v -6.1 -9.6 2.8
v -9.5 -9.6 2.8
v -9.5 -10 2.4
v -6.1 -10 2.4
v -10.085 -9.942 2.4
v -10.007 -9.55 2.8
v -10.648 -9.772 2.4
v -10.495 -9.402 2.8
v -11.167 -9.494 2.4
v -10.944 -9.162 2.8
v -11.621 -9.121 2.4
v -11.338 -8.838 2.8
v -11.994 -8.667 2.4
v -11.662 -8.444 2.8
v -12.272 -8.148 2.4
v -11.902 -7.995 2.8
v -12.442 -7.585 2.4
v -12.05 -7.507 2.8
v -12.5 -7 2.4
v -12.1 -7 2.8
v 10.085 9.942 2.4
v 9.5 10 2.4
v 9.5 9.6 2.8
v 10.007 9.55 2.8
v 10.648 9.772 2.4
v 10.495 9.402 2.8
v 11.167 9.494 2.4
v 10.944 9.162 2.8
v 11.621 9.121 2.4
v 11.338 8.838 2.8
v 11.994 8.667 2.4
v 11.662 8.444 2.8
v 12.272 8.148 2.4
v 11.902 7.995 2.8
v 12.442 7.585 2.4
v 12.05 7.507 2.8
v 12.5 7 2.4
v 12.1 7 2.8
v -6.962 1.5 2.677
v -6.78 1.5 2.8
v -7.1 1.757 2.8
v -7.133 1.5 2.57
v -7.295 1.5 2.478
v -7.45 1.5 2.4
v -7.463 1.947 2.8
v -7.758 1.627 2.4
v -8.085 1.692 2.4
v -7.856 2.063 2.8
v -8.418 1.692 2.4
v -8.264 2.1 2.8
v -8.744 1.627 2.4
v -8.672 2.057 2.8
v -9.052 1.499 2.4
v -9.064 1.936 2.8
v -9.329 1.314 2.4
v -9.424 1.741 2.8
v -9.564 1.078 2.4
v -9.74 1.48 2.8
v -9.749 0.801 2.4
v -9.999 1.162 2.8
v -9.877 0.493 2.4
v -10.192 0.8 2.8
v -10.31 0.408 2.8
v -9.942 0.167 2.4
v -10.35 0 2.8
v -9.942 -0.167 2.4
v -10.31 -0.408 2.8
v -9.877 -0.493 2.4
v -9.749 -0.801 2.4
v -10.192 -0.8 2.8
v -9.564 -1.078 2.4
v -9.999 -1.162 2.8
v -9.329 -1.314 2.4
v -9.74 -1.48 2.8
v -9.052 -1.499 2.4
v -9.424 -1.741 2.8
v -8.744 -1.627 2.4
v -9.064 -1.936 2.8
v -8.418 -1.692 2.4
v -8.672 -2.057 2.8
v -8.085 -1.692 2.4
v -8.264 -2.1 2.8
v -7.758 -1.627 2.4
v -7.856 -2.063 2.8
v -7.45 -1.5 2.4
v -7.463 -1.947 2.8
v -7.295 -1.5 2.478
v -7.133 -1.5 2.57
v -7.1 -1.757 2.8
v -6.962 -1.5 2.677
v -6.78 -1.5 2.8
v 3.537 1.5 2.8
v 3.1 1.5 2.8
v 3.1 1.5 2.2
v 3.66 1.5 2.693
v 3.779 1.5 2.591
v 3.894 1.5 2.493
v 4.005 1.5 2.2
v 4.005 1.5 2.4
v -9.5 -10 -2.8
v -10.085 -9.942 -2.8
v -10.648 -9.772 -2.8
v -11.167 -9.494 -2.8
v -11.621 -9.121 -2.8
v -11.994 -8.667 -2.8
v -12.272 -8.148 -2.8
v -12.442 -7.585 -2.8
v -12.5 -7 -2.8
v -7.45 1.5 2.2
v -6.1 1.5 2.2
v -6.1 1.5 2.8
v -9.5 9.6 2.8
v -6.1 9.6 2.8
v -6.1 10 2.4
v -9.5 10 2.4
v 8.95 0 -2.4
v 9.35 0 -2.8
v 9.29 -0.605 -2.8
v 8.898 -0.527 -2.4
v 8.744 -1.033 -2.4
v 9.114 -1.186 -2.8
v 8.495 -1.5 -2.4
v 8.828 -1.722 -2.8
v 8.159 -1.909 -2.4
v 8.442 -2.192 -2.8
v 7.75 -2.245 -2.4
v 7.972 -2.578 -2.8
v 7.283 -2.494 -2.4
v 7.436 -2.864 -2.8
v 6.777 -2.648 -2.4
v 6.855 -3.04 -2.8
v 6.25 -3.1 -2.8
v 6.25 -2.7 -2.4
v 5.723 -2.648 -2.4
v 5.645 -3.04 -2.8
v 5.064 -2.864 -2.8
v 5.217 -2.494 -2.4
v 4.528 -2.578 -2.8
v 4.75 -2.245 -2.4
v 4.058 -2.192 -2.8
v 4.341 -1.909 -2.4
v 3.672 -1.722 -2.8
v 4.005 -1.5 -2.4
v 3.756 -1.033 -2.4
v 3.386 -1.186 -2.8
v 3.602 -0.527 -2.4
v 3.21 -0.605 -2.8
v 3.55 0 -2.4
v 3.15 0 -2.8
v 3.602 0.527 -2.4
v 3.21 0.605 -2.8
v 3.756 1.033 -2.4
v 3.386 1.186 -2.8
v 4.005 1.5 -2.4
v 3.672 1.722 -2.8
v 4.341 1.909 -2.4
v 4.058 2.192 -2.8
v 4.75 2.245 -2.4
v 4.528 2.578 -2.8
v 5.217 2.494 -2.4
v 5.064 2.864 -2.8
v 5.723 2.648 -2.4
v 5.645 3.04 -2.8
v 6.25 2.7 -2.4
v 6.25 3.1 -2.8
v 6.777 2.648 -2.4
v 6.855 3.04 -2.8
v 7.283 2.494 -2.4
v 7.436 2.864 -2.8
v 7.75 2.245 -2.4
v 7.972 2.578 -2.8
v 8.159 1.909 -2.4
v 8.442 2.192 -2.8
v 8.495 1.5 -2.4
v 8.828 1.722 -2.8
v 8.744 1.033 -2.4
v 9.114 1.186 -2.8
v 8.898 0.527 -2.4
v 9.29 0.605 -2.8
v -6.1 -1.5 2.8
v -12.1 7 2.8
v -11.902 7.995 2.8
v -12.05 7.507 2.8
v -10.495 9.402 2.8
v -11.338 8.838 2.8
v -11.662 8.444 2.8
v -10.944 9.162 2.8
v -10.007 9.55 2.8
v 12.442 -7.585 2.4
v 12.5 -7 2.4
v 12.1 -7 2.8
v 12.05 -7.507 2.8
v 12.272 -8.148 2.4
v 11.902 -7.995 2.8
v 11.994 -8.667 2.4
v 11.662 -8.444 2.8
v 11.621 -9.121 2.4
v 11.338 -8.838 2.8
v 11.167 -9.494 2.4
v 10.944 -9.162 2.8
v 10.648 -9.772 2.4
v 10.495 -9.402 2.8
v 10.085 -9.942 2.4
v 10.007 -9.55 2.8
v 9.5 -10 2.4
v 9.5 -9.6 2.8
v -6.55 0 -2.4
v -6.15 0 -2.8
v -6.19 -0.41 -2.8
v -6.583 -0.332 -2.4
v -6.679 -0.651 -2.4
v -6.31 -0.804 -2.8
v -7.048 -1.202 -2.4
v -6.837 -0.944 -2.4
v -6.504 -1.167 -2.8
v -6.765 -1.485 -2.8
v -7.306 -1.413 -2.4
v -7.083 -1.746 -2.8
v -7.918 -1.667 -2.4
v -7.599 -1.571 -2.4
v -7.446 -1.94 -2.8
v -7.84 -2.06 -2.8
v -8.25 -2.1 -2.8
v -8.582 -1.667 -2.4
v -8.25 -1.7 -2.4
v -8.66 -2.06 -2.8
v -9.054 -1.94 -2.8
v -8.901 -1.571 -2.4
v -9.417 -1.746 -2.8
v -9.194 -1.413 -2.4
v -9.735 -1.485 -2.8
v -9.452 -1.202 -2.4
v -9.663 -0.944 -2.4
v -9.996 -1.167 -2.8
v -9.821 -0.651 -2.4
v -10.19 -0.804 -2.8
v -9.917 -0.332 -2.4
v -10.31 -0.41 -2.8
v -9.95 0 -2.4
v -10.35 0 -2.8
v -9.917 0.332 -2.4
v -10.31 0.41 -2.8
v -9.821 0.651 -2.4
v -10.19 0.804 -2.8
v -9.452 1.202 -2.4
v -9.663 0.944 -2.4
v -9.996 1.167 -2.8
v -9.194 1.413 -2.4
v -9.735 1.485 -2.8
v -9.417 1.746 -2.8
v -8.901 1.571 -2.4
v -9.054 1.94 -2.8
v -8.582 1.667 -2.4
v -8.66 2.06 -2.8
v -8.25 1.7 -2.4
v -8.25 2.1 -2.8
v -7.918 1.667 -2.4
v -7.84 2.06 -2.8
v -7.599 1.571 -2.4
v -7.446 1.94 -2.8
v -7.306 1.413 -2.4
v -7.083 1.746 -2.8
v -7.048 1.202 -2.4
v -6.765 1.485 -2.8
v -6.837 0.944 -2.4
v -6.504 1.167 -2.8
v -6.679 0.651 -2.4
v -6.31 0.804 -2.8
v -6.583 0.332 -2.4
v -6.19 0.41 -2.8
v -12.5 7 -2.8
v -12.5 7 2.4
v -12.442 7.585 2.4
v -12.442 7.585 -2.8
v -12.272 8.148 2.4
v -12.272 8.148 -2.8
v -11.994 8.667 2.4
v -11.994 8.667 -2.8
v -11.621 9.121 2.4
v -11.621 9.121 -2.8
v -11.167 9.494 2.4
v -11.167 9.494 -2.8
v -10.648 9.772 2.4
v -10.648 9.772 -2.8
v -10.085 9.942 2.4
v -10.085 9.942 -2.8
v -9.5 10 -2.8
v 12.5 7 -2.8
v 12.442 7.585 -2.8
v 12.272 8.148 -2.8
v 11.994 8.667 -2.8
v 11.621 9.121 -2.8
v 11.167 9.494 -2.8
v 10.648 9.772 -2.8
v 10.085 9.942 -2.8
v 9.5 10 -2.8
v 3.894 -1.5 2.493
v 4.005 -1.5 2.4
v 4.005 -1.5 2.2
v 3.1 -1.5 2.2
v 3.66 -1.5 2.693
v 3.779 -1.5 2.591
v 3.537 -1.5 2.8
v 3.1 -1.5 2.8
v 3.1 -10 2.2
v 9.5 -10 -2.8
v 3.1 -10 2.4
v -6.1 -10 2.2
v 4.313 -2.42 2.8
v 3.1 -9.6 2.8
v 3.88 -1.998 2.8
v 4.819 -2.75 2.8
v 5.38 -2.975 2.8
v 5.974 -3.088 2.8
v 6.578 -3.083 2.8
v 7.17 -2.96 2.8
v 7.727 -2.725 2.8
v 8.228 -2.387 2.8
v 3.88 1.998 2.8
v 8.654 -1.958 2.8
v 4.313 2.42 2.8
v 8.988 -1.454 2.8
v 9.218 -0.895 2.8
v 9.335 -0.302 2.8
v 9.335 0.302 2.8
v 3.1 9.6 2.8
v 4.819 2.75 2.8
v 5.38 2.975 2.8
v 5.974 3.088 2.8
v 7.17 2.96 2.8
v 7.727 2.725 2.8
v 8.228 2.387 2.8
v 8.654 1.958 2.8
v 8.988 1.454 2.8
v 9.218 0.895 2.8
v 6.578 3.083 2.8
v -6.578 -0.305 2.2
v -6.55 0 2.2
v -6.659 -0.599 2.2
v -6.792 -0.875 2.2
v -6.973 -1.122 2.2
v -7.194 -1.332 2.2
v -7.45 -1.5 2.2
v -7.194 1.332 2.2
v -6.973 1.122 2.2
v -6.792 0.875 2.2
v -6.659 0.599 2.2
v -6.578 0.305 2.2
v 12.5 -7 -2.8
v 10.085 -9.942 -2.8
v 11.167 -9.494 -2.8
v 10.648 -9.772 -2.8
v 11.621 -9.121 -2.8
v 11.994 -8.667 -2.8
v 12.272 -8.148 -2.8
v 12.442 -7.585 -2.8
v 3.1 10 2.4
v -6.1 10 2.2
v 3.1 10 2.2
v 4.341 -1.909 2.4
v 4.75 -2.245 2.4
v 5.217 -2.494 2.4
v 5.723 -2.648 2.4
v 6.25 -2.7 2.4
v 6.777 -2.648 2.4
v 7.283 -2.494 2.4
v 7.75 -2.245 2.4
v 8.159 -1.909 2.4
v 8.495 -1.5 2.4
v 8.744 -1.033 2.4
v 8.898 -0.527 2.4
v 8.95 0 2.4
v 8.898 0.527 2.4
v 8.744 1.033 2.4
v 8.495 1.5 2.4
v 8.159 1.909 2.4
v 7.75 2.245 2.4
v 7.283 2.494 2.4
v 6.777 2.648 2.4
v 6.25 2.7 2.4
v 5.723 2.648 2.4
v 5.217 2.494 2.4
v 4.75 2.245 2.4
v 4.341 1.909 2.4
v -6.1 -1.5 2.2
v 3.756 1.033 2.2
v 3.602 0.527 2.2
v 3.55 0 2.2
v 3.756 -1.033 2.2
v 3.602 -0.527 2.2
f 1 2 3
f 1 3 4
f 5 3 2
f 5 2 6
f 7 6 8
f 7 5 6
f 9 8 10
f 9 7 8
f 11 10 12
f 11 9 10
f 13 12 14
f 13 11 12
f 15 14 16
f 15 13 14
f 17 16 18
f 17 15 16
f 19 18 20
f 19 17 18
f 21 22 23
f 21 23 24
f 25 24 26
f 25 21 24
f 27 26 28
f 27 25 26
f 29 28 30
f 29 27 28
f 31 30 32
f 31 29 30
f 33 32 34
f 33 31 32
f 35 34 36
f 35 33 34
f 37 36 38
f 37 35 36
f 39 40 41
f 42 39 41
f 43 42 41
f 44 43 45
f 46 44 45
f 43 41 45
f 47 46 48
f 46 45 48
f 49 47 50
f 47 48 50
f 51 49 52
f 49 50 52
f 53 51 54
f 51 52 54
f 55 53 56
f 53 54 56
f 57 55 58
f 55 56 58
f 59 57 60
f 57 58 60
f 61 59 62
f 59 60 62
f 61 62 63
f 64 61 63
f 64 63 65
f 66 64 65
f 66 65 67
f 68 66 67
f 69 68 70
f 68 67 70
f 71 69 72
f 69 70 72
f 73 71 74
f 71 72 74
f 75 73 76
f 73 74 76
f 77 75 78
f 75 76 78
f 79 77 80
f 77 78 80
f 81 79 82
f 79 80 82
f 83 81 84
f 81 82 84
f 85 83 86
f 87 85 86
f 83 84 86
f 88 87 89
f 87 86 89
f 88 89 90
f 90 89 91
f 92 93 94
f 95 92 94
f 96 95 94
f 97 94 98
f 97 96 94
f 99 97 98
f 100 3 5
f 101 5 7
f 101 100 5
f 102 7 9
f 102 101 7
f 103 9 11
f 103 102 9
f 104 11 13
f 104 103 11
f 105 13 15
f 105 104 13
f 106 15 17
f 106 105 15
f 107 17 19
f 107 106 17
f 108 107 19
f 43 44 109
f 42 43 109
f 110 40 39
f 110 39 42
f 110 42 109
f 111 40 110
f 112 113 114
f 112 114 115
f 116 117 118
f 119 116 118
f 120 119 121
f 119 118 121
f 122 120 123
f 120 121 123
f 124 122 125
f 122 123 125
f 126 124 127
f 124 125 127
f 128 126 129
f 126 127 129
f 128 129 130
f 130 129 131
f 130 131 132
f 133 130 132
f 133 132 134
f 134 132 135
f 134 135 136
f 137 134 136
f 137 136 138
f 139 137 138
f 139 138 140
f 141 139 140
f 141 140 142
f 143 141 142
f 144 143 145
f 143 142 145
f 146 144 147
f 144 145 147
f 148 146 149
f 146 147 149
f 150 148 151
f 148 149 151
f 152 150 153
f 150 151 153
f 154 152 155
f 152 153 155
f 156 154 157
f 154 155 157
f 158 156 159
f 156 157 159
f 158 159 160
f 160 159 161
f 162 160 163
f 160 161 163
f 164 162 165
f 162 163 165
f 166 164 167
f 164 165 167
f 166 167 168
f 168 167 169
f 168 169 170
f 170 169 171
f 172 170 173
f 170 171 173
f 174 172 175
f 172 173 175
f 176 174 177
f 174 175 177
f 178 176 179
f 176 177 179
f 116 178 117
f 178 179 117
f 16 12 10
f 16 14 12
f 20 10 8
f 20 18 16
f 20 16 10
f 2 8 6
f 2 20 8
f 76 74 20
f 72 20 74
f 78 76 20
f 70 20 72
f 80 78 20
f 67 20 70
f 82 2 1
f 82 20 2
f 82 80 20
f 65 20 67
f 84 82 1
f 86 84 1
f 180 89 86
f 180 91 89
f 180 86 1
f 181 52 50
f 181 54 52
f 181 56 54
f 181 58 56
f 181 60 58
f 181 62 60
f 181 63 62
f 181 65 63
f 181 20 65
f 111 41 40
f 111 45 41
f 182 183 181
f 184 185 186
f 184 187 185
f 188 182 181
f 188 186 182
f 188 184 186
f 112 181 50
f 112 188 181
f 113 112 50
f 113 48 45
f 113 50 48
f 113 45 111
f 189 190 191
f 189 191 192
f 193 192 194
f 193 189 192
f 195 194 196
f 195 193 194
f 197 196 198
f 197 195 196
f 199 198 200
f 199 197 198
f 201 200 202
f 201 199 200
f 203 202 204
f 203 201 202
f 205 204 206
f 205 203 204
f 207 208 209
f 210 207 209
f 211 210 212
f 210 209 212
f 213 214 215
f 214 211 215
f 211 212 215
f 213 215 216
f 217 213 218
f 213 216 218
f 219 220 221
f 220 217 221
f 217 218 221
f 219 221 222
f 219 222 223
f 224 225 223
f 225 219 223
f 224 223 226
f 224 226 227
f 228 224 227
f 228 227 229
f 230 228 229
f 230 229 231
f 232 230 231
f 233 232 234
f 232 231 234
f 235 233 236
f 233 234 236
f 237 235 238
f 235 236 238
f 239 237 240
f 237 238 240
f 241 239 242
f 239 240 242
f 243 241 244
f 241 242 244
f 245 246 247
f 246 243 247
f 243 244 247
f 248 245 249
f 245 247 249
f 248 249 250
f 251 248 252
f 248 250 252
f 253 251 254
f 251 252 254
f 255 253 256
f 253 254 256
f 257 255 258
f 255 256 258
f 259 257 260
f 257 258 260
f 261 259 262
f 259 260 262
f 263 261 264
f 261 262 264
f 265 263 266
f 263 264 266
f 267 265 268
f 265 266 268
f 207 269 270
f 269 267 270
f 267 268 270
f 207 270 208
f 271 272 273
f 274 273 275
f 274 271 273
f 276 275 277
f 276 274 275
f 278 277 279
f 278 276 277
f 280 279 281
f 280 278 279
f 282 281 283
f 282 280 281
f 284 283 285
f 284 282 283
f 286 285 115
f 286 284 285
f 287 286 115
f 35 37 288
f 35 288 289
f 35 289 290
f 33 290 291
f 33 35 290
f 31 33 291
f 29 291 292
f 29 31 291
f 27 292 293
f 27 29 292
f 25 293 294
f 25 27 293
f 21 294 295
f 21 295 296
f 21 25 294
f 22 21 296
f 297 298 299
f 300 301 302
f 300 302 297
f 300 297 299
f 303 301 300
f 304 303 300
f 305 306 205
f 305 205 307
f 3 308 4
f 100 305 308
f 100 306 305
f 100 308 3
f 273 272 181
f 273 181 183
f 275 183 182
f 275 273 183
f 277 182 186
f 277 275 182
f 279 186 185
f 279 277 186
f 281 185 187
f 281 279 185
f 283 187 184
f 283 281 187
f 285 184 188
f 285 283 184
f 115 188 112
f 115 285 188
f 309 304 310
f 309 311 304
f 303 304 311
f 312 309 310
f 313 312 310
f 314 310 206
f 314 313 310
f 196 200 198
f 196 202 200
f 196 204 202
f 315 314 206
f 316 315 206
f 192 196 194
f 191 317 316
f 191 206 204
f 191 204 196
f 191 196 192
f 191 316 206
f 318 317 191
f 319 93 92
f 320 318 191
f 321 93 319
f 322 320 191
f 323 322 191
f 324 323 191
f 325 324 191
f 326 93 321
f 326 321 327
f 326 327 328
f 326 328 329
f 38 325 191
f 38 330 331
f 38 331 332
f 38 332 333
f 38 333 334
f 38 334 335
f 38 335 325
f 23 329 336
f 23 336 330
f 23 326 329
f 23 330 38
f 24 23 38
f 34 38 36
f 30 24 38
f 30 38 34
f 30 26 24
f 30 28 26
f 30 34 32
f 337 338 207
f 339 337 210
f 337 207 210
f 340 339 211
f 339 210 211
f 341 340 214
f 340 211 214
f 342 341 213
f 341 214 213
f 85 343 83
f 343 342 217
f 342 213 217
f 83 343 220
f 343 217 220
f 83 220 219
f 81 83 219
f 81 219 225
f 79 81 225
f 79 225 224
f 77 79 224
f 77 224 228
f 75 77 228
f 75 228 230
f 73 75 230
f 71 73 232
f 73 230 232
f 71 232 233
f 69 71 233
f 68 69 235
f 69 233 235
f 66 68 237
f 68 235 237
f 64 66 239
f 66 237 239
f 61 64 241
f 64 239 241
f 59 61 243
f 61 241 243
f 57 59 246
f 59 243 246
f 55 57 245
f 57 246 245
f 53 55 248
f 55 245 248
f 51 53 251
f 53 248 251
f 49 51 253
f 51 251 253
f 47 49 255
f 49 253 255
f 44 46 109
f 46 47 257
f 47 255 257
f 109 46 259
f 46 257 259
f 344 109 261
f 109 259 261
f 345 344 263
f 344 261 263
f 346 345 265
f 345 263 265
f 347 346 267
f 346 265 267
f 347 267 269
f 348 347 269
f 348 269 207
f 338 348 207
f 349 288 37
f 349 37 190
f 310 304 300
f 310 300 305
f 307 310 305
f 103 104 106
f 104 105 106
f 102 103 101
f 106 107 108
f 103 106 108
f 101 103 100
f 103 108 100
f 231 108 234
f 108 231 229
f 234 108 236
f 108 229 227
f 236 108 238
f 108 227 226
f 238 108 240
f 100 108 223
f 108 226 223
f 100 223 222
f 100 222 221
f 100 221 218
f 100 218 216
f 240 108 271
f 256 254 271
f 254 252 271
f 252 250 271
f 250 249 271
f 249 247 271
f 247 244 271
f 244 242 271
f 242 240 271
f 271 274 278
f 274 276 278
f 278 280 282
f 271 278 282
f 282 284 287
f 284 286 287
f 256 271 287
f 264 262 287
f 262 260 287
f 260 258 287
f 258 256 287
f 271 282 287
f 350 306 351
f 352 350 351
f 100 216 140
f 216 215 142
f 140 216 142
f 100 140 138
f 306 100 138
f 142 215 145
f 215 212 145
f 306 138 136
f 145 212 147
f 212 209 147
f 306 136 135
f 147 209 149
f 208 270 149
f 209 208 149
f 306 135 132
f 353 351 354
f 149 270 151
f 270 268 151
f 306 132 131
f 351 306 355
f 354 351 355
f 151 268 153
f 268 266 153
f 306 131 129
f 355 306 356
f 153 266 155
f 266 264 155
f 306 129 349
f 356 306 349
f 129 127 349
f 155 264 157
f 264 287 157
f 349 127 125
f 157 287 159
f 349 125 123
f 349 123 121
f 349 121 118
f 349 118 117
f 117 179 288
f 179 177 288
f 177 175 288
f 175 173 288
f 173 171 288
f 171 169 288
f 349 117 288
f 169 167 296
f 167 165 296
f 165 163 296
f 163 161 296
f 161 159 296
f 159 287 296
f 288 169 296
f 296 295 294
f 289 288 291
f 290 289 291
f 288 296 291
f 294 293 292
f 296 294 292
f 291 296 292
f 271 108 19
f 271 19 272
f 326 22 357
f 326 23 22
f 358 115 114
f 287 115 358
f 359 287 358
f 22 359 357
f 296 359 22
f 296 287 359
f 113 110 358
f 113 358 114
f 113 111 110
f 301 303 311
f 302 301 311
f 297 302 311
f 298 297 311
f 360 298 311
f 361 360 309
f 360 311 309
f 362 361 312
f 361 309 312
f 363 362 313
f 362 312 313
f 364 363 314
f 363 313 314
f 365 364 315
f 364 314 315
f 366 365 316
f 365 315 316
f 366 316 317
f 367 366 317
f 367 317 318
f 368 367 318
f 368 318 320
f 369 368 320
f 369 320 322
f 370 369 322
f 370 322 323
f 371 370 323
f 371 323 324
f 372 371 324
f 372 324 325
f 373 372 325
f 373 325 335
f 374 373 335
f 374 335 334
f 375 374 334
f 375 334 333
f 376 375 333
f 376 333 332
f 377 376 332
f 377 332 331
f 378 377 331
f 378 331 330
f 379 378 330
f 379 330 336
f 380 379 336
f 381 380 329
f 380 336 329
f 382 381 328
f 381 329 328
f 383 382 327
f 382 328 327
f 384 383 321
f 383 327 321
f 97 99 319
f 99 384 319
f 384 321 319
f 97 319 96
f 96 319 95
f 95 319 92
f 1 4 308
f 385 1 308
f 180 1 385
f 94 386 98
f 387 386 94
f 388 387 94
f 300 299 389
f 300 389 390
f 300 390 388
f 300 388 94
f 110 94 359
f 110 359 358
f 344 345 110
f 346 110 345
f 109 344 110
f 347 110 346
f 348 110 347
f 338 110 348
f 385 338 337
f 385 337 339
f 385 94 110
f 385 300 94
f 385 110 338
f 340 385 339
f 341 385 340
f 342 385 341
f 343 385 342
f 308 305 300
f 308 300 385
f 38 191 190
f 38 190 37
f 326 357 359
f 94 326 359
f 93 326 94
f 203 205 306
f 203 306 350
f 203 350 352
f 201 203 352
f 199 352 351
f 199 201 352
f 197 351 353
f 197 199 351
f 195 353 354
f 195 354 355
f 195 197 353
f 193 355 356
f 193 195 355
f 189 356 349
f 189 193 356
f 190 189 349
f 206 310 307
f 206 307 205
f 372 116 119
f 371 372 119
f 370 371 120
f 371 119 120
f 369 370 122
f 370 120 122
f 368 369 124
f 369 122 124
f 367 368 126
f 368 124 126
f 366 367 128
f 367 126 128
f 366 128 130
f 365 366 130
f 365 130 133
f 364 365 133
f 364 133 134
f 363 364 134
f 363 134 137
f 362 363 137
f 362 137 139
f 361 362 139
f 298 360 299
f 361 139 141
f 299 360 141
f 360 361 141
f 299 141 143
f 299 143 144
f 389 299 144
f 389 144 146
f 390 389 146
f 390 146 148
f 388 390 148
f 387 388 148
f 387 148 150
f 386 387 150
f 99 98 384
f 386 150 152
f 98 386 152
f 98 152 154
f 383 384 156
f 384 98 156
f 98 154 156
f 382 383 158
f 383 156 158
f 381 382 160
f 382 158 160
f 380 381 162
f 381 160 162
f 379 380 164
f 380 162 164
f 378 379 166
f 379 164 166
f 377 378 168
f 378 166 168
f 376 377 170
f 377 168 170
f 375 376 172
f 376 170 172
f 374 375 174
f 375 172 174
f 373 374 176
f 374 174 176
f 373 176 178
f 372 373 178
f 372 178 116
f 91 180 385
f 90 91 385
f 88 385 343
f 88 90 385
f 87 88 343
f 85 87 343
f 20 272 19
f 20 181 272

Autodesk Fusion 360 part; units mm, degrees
sketch "Sketch1" plane through (0, 0, 0) normal (0, 0, 1) x (1, 0, 0) in component "Component"
  line L0 (12.5, -10) -> (-12.5, -10)
  line L1 (-12.5, -10) -> (-12.5, 10)
  line L2 (-12.5, 10) -> (12.5, 10)
  line L3 (12.5, 10) -> (12.5, -10)
  line L4 (12.5, -10) -> (-12.5, 10) construction
  line L5 (-12.5, -10) -> (12.5, 10) construction
  line L6 (-12.5, 0) -> (12.5, 0) construction
  line L7 (0, 10) -> (0, -10) construction
  circle A0 centre (-8.25, 0) radius 1.7
  circle A1 centre (6.25, 0) radius 2.7
  dimension "d7" = 25
  dimension "d8" = 20
  dimension "d9" = 3.4
  dimension "d10" = 5.4
  dimension "d11" = 4.25
  dimension "d12" = 6.25
extrude "Extrude1" add sketch "Sketch1" along normal mid plane 5.6 in component "Component"
fillet "Fillet1" radius 3 4 edges at (-12.5, -10, 0) (12.5, -10, 0) (12.5, 10, 0) (-12.5, 10, 0) in component "Component"
chamfer "Chamfer1" distance 0.4 angle 45 12 edges at (0, -10, 2.8) (11.6213, -9.1213, 2.8) (12.5, 0, 2.8) (11.6213, 9.1213, 2.8) (0, 10, 2.8) (-11.6213, 9.1213, 2.8) (-12.5, 0, 2.8) (-11.6213, -9.1213, 2.8) (3.7327, 0.9764, 2.8) (-9.835, 0.6147, 2.8) (3.7327, -0.9764, -2.8) (-9.835, -0.6147, -2.8) in component "Component"
sketch "Sketch2" plane through (0, 0, 2.8) normal (0, 0, 1) x (-1, 0, 0) in component "Component"
  circle A0 centre (-6.25, 0) radius 3.1
  line L0 (9.5, 9.6) -> (-9.5, 9.6)
  arc A1 (-9.5, 9.6) -> (-12.1, 7) centre (-9.5, 7) ccw
  line L1 (-12.1, 7) -> (-12.1, -7)
  arc A2 (-12.1, -7) -> (-9.5, -9.6) centre (-9.5, -7) ccw
  line L2 (-9.5, -9.6) -> (9.5, -9.6)
  arc A3 (9.5, -9.6) -> (12.1, -7) centre (9.5, -7) ccw
  line L3 (12.1, -7) -> (12.1, 7)
  arc A4 (12.1, 7) -> (9.5, 9.6) centre (9.5, 7) ccw
  circle A5 centre (8.25, 0) radius 2.1
  line L4 (12.5, -10) -> (-12.5, -10)
  line L5 (12.5, 10) -> (12.5, -10)
  line L6 (-12.5, 10) -> (12.5, 10)
  line L7 (-12.5, -10) -> (-12.5, 10)
  line L8 (6.1, -10) -> (-3.1, -10)
  line L9 (-3.1, -10) -> (-3.1, 10)
  line L10 (-3.1, 10) -> (6.1, 10)
  line L11 (6.1, 10) -> (6.1, -10)
  dimension "d19" = 9.4
  dimension "d28" = 9.2
extrude "Extrude2" cut sketch "Sketch2" against normal blind 0.6 contours L0 L2 L9 L11 | L0 L6 L9 L10 L11 | L2 L4 L8 L9 L11 in component "Component"
sketch "Sketch3" plane through (0, 0, 2.8) normal (0, 0, 1) x (-1, 0, 0) in component "Component"
  line L0 (-3.1, -9.6) -> (-3.1, 9.6)
  line L1 (-3.1, 9.6) -> (-9.5, 9.6)
  arc A0 (-9.5, 9.6) -> (-12.1, 7) centre (-9.5, 7) ccw
  line L2 (-12.1, 7) -> (-12.1, -7)
  arc A1 (-12.1, -7) -> (-9.5, -9.6) centre (-9.5, -7) ccw
  line L3 (-9.5, -9.6) -> (-3.1, -9.6)
  circle A2 centre (-6.25, 0) radius 3.1
  line L4 (12.5, -10) -> (-12.5, -10)
  line L5 (12.5, 10) -> (12.5, -10)
  line L6 (-12.5, 10) -> (12.5, 10)
  line L7 (-12.5, -10) -> (-12.5, 10)
  line L8 (-8, 1.5) -> (8, 1.5)
  line L9 (8, 1.5) -> (8, -1.5)
  line L10 (8, -1.5) -> (-8, -1.5)
  line L11 (-8, -1.5) -> (-8, 1.5)
  line L12 (-8, 1.5) -> (8, -1.5) construction
  line L13 (8, 1.5) -> (-8, -1.5) construction
  dimension "d22" = 3
  dimension "d23" = 16
extrude "Extrude3" cut sketch "Sketch3" against normal blind 0.6 contours L0 A2 L8 L10 | L0 L8 L9 L10 | A2 L8 L10 L11 picked at (-6.3833, 0) in component "Component"
component "Component" placed x (1, 0, 0) y (0, 1, 0) z (0, 0, 1) at (0, 0, 0)
equation "d7 = z_belt_width + 16 mm"
equation "d13 = ( 5.6 / 2 ) * 1 mm"
equation "d17 = chamfer"
equation "z_belt_width = 9 mm"
equation "tolerance = 0.2 mm"
equation "d28 = z_belt_width + tolerance"
equation "chamfer = 0.4 mm"
